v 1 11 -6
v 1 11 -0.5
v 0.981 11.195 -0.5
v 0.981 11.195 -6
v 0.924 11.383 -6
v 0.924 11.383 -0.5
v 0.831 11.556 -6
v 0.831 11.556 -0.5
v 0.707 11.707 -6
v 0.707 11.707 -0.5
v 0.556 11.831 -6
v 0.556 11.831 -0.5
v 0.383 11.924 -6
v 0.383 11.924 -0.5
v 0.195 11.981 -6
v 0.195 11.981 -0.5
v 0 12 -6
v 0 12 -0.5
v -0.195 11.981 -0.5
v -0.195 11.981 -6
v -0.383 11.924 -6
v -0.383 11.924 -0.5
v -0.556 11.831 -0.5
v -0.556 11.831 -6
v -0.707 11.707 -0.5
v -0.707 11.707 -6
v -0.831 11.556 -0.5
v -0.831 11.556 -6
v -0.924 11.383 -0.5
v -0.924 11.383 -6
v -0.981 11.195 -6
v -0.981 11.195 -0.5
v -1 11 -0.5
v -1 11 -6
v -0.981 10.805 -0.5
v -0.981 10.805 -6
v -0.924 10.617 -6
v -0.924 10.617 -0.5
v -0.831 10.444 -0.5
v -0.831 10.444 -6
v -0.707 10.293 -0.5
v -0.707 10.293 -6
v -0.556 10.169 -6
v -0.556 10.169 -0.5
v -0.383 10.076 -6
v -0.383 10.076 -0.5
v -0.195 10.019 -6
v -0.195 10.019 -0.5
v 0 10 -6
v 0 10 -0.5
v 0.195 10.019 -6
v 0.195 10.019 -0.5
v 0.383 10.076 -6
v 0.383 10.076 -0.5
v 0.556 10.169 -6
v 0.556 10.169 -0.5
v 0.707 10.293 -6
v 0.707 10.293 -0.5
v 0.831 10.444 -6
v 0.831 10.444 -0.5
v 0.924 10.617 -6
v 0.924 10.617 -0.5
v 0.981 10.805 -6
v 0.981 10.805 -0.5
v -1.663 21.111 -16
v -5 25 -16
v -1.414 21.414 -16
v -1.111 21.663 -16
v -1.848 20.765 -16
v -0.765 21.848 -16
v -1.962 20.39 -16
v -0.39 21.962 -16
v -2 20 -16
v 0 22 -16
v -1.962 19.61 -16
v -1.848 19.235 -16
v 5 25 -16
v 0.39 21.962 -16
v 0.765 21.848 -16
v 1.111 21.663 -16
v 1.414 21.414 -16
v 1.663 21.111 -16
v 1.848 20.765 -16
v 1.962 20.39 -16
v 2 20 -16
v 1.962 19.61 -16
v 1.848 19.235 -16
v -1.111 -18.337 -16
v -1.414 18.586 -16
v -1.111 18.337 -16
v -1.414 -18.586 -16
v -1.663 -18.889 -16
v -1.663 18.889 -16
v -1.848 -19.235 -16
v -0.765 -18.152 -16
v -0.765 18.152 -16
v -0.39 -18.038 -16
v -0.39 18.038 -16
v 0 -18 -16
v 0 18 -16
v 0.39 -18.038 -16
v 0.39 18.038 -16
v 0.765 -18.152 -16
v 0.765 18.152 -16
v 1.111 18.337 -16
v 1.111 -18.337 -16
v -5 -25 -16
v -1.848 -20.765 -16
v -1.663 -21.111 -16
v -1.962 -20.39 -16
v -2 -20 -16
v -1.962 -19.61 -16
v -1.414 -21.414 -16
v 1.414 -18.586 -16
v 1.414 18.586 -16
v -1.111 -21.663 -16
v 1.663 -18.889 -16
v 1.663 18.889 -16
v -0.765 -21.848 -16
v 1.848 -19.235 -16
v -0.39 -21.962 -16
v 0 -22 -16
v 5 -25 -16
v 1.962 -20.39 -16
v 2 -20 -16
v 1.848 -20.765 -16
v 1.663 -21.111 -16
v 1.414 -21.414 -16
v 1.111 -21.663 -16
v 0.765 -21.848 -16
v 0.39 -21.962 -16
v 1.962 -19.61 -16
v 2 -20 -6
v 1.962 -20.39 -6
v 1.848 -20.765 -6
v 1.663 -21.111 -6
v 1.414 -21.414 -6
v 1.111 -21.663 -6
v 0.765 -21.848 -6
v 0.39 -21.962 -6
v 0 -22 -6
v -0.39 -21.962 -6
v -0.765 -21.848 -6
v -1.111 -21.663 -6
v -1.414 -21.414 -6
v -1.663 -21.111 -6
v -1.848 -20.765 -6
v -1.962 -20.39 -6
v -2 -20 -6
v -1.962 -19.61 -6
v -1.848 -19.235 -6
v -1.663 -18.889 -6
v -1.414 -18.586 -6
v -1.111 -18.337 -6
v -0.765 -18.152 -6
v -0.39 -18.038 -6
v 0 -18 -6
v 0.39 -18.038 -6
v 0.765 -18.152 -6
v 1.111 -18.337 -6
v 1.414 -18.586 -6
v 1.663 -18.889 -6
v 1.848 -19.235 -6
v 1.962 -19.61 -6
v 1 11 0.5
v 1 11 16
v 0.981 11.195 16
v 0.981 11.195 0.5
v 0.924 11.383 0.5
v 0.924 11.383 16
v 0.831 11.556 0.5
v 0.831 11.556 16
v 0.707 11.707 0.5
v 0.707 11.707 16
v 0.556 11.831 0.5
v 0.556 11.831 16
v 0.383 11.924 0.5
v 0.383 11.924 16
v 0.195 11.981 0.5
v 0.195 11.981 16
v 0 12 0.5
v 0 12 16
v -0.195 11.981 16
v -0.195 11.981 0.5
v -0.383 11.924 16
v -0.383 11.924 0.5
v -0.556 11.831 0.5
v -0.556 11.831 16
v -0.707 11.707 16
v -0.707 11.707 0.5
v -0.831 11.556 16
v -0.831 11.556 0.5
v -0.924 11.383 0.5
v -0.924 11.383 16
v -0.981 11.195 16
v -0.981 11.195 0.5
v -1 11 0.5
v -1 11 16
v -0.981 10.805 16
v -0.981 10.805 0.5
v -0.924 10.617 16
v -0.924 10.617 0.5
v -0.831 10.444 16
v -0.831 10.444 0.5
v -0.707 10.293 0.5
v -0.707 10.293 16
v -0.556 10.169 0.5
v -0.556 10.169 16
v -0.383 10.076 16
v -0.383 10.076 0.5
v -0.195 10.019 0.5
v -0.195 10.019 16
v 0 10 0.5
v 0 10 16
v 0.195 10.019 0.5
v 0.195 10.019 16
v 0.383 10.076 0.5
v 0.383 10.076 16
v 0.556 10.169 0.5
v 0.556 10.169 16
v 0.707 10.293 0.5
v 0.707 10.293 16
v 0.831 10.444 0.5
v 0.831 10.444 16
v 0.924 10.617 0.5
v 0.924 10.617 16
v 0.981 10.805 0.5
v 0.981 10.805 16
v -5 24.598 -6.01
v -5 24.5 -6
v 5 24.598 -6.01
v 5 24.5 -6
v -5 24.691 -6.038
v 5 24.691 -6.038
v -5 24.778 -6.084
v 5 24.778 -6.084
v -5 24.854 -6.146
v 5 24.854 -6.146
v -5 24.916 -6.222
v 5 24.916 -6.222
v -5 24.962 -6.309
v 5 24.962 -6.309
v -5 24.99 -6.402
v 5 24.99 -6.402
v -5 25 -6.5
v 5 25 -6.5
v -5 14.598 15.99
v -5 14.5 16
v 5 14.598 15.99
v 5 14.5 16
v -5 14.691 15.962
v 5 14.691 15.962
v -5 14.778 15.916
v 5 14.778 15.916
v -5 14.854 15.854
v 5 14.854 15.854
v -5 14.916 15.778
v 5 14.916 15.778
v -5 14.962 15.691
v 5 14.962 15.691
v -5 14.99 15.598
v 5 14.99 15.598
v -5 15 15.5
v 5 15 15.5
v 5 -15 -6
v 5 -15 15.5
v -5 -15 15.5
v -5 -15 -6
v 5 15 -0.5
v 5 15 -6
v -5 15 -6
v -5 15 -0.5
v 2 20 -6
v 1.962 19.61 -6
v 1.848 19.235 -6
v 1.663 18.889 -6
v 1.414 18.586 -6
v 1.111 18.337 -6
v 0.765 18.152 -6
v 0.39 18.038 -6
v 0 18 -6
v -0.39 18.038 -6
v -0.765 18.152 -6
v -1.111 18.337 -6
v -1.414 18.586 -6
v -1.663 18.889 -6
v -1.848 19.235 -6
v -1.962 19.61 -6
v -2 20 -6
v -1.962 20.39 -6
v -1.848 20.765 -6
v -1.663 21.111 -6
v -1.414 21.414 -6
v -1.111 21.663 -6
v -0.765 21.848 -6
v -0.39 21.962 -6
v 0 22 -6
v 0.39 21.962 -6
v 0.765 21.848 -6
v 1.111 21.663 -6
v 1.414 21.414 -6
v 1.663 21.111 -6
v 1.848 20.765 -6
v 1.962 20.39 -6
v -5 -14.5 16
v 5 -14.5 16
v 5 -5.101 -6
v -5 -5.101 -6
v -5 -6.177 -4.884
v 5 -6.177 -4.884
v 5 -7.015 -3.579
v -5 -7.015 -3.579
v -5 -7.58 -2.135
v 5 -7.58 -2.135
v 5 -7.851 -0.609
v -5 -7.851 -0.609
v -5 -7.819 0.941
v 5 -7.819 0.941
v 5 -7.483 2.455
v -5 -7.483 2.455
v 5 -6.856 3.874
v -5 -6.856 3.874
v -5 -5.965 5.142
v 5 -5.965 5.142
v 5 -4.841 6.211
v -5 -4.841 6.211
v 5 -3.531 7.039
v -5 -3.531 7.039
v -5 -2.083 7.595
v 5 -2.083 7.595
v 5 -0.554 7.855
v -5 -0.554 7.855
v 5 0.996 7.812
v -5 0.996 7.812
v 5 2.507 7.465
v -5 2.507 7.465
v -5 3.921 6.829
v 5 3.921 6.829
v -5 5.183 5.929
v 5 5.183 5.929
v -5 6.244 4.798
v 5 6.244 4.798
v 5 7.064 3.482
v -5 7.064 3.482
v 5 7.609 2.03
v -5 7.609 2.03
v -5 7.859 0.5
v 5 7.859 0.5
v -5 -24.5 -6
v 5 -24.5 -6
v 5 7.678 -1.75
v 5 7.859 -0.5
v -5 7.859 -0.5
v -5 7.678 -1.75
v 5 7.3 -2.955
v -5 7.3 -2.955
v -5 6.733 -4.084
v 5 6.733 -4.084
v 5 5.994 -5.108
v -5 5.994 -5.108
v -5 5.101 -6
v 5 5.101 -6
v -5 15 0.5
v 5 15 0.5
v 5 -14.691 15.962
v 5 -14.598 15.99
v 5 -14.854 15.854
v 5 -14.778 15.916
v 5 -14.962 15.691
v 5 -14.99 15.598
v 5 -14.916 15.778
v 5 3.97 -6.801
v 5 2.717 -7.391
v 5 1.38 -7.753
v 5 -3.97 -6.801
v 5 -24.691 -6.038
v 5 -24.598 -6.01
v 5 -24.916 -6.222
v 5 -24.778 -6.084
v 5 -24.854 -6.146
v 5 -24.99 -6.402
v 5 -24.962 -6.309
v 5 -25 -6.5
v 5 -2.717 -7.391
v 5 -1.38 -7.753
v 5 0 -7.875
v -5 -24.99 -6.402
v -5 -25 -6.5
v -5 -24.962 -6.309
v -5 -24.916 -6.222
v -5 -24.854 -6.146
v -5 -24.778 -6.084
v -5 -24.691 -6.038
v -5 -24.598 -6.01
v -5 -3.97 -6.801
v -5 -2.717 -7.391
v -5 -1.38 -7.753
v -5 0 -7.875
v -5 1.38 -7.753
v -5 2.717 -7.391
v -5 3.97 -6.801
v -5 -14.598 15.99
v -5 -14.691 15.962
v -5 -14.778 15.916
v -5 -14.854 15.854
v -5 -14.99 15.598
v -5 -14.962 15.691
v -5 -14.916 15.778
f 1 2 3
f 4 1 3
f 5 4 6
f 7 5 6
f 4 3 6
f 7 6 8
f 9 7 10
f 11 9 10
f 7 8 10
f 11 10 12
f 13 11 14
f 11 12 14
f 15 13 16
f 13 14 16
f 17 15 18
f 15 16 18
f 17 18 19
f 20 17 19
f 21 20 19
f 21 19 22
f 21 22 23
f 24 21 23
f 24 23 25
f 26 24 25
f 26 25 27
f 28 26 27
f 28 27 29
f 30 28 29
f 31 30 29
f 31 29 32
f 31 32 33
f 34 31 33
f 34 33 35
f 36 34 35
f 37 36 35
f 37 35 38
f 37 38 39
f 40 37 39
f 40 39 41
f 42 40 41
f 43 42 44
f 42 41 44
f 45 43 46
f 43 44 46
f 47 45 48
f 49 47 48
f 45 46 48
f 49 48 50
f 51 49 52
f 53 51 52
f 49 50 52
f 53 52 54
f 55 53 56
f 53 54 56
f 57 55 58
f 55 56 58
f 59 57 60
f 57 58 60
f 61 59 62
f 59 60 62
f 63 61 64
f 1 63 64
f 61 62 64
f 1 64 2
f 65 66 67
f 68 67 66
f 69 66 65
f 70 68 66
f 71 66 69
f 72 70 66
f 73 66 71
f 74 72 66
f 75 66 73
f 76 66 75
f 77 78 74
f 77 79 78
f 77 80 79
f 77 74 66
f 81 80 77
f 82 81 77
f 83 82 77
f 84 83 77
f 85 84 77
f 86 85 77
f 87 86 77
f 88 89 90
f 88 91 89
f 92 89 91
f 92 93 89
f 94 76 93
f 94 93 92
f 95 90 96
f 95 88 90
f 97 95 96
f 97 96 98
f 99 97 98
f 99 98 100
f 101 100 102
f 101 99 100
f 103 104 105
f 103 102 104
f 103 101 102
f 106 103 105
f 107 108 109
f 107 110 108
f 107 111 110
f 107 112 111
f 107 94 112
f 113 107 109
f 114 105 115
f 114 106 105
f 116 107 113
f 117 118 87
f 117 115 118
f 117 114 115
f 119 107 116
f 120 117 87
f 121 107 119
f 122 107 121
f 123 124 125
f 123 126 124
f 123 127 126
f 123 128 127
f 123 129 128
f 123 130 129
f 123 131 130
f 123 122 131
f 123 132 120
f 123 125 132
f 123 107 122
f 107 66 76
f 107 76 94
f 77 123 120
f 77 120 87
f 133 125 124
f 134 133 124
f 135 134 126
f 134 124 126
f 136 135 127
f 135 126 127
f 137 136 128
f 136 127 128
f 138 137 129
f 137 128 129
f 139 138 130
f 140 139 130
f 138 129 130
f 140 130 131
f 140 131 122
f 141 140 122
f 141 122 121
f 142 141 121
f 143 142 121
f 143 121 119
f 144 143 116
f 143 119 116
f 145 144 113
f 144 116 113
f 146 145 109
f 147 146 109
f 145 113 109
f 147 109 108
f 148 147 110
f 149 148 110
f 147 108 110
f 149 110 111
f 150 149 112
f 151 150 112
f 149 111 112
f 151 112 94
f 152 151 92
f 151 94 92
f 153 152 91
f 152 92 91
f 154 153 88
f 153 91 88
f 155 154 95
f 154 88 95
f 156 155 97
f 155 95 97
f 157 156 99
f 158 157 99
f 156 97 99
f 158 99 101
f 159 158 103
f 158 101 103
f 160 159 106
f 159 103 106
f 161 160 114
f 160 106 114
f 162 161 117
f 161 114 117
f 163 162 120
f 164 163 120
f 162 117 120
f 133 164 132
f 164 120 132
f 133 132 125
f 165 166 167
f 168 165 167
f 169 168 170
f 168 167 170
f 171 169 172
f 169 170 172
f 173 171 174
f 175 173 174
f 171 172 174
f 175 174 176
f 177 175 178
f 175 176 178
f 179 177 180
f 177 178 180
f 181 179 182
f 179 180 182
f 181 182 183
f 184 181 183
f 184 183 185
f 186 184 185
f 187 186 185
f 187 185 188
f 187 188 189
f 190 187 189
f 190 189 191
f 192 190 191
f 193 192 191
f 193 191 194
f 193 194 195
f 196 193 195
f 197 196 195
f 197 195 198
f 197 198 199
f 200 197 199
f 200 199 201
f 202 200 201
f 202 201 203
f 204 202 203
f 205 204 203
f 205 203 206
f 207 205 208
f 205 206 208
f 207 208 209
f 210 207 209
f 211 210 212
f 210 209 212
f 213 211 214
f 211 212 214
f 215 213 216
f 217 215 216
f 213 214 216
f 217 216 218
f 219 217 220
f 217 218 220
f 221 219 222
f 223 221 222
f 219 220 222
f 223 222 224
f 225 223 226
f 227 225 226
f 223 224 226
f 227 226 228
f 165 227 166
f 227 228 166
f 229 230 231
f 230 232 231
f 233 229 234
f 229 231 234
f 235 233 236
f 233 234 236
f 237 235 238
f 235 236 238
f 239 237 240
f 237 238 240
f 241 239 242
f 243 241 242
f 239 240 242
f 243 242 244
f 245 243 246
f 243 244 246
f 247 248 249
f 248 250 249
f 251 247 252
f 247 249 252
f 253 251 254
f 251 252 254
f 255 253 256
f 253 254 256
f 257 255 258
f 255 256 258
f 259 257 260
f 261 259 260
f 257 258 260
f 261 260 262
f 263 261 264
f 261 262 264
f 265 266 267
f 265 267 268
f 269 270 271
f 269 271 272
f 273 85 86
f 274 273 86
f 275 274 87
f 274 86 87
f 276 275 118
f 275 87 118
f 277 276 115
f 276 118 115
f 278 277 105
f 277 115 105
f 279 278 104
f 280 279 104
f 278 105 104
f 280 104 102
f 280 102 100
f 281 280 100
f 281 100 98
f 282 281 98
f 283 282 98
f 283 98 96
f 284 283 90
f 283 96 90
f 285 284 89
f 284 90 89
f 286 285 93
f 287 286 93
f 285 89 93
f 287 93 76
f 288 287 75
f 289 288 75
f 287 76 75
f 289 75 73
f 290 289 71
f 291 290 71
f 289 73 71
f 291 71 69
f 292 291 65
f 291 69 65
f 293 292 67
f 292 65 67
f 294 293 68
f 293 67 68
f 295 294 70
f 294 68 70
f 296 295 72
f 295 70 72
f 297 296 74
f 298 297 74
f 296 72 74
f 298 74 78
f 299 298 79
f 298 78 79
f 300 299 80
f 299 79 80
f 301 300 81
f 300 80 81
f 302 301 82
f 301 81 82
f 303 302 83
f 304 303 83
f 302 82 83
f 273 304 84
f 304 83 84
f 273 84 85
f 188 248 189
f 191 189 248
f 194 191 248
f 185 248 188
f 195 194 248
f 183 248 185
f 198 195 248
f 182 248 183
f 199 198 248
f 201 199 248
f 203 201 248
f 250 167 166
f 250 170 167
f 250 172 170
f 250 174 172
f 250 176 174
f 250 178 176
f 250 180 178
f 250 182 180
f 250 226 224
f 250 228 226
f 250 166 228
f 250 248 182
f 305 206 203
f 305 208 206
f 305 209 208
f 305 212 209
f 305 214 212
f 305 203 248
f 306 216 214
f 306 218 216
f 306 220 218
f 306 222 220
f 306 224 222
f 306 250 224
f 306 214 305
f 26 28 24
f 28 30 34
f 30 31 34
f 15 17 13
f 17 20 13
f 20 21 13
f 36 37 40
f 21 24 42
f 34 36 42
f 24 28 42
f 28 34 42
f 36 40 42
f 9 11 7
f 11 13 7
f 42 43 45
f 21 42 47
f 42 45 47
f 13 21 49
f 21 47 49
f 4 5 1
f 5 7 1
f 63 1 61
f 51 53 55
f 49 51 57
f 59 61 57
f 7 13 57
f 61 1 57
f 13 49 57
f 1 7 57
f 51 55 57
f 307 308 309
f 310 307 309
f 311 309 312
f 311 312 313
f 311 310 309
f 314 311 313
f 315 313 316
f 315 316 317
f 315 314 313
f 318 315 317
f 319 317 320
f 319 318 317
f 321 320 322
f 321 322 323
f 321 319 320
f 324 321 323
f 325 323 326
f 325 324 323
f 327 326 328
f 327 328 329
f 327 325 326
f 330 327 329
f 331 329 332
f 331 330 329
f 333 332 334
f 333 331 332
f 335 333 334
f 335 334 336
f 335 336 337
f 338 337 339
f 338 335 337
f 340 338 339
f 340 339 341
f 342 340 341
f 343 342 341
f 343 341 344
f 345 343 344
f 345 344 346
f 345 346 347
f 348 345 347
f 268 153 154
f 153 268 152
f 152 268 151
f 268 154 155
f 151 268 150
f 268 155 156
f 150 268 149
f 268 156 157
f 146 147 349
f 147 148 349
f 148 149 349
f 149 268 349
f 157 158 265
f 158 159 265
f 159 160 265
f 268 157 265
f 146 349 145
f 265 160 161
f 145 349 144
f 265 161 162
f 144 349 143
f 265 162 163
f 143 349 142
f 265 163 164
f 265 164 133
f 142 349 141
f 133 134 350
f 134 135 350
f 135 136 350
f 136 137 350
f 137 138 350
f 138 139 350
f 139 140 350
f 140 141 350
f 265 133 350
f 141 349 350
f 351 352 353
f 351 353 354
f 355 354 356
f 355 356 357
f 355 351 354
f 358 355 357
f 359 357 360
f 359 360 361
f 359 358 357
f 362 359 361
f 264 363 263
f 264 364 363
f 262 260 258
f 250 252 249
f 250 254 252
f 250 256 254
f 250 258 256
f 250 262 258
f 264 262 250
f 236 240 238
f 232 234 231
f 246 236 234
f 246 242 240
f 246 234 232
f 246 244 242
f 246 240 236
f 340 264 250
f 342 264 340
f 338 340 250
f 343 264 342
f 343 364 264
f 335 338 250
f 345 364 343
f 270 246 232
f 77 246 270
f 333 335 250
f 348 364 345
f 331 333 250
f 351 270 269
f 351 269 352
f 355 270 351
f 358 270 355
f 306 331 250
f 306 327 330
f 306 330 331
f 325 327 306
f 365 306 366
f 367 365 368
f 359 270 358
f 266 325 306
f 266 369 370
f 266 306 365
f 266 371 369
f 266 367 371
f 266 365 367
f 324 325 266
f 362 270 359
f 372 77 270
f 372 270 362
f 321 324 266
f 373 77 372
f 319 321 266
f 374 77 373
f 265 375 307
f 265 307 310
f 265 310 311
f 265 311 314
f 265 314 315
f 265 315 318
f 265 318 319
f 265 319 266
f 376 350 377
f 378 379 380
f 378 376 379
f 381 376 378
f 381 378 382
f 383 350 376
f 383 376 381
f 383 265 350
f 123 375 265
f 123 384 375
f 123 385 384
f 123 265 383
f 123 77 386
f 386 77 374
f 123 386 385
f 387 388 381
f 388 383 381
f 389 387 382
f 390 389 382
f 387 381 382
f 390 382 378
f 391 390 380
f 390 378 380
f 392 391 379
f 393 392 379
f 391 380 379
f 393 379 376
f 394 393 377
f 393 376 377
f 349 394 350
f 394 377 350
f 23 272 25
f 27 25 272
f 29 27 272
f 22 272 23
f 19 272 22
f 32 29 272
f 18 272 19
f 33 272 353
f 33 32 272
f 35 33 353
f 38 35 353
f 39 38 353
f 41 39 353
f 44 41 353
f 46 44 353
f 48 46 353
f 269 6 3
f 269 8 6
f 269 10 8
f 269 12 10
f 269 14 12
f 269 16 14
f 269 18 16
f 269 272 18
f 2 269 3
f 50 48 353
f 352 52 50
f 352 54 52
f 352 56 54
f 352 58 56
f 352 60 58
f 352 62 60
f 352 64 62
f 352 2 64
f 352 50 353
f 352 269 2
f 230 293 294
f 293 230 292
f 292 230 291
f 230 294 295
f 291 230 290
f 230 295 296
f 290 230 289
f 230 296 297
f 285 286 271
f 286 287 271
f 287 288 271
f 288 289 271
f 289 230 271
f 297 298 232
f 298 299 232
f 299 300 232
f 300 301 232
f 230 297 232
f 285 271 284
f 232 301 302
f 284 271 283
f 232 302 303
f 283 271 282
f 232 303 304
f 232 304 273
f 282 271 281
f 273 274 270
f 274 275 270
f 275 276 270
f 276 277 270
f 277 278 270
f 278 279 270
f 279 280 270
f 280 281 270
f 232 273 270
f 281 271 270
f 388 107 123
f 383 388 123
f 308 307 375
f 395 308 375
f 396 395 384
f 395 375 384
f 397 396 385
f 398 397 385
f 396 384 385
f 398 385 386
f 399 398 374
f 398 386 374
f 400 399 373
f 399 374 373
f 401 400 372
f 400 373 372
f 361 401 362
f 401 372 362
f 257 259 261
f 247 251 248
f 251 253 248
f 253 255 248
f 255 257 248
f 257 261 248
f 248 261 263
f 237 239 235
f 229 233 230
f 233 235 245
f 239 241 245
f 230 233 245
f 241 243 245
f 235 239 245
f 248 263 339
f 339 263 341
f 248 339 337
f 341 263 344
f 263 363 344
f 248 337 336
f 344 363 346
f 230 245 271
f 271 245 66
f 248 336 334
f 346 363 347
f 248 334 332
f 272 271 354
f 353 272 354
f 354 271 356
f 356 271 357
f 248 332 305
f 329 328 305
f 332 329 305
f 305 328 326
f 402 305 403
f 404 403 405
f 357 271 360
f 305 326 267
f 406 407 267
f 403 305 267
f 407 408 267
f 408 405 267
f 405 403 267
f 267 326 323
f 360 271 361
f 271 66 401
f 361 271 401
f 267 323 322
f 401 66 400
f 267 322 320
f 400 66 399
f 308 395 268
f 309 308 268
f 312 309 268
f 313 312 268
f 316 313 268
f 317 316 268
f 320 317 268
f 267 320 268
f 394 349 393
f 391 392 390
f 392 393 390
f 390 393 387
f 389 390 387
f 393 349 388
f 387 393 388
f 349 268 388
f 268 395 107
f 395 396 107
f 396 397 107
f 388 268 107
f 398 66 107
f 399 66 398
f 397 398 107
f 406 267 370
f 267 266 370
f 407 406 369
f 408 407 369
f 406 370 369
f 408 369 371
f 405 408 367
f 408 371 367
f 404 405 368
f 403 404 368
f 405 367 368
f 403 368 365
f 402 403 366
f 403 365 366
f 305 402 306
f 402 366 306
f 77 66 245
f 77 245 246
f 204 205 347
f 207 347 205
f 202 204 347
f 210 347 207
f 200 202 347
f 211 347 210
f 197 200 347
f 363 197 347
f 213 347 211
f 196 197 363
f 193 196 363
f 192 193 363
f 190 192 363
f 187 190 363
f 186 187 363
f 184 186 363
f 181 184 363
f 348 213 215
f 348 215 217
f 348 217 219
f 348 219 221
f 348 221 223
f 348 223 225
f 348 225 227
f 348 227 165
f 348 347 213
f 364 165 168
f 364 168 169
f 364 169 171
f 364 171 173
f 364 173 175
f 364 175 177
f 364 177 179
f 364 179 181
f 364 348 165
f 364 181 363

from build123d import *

# Parameters (mm, degrees)
F1_DEPTH      = 5
F1_DEPTH_BACK = 5
F2_R          = 1
F3_DEPTH      = 32.001
F4_W          = 10
F4_H          = 50
F4_R          = 2
F5_DEPTH      = 10
F6_R          = 7.875
F7_DEPTH      = 10.001
F8_R          = 0.5


with BuildPart() as f1:
    # F0 (on Right) → F1 (new body, two sides)
    with BuildSketch(Plane.YZ) as f1_sk:
        with BuildLine():
            Line((15, 0.5), (15, 16))
            Line((15, 16), (-15, 16))
            Line((-15, 16), (-15, -16))
            Line((-15, -16), (15, -16))
            Line((15, -16), (15, -0.5))
            Line((15, -0.5), (7.859111, -0.5))
            ThreePointArc((7.859111, -0.5), (-7.875, 0), (7.859111, 0.5))
            Line((7.859111, 0.5), (15, 0.5))
        make_face()
    extrude(amount=F1_DEPTH)
    extrude(f1_sk.sketch, amount=-F1_DEPTH_BACK)

    # F2 (on face) → F3 (cut, through all)
    with BuildSketch(Plane.XY.offset(16)):
        with Locations((0, 11)):
            Circle(F2_R)
    extrude(amount=-F3_DEPTH, mode=Mode.SUBTRACT)

    # F4 (on face) → F5 (join)
    with BuildSketch(Plane(origin=(0, 0, -16), x_dir=(1, 0, 0), z_dir=(0, 0, -1))):
        Rectangle(F4_W, F4_H)
        with Locations((0, -20)):
            Circle(F4_R, mode=Mode.SUBTRACT)
        with Locations((0, 20)):
            Circle(F4_R, mode=Mode.SUBTRACT)
    extrude(amount=-F5_DEPTH)

    # F6 (on face) → F7 (cut, through all)
    with BuildSketch(Plane.YZ.offset(5)):
        Circle(F6_R)
    extrude(amount=-F7_DEPTH, mode=Mode.SUBTRACT)

    # F8
    f8_edges = [f1.edges().sort_by_distance(p)[0] for p in [
        (0, -15, 16),
        (0, 15, 16),
        (0, -25, -6),
        (0, 25, -6),
    ]]
    fillet(f8_edges, radius=F8_R)


solid = f1.part
